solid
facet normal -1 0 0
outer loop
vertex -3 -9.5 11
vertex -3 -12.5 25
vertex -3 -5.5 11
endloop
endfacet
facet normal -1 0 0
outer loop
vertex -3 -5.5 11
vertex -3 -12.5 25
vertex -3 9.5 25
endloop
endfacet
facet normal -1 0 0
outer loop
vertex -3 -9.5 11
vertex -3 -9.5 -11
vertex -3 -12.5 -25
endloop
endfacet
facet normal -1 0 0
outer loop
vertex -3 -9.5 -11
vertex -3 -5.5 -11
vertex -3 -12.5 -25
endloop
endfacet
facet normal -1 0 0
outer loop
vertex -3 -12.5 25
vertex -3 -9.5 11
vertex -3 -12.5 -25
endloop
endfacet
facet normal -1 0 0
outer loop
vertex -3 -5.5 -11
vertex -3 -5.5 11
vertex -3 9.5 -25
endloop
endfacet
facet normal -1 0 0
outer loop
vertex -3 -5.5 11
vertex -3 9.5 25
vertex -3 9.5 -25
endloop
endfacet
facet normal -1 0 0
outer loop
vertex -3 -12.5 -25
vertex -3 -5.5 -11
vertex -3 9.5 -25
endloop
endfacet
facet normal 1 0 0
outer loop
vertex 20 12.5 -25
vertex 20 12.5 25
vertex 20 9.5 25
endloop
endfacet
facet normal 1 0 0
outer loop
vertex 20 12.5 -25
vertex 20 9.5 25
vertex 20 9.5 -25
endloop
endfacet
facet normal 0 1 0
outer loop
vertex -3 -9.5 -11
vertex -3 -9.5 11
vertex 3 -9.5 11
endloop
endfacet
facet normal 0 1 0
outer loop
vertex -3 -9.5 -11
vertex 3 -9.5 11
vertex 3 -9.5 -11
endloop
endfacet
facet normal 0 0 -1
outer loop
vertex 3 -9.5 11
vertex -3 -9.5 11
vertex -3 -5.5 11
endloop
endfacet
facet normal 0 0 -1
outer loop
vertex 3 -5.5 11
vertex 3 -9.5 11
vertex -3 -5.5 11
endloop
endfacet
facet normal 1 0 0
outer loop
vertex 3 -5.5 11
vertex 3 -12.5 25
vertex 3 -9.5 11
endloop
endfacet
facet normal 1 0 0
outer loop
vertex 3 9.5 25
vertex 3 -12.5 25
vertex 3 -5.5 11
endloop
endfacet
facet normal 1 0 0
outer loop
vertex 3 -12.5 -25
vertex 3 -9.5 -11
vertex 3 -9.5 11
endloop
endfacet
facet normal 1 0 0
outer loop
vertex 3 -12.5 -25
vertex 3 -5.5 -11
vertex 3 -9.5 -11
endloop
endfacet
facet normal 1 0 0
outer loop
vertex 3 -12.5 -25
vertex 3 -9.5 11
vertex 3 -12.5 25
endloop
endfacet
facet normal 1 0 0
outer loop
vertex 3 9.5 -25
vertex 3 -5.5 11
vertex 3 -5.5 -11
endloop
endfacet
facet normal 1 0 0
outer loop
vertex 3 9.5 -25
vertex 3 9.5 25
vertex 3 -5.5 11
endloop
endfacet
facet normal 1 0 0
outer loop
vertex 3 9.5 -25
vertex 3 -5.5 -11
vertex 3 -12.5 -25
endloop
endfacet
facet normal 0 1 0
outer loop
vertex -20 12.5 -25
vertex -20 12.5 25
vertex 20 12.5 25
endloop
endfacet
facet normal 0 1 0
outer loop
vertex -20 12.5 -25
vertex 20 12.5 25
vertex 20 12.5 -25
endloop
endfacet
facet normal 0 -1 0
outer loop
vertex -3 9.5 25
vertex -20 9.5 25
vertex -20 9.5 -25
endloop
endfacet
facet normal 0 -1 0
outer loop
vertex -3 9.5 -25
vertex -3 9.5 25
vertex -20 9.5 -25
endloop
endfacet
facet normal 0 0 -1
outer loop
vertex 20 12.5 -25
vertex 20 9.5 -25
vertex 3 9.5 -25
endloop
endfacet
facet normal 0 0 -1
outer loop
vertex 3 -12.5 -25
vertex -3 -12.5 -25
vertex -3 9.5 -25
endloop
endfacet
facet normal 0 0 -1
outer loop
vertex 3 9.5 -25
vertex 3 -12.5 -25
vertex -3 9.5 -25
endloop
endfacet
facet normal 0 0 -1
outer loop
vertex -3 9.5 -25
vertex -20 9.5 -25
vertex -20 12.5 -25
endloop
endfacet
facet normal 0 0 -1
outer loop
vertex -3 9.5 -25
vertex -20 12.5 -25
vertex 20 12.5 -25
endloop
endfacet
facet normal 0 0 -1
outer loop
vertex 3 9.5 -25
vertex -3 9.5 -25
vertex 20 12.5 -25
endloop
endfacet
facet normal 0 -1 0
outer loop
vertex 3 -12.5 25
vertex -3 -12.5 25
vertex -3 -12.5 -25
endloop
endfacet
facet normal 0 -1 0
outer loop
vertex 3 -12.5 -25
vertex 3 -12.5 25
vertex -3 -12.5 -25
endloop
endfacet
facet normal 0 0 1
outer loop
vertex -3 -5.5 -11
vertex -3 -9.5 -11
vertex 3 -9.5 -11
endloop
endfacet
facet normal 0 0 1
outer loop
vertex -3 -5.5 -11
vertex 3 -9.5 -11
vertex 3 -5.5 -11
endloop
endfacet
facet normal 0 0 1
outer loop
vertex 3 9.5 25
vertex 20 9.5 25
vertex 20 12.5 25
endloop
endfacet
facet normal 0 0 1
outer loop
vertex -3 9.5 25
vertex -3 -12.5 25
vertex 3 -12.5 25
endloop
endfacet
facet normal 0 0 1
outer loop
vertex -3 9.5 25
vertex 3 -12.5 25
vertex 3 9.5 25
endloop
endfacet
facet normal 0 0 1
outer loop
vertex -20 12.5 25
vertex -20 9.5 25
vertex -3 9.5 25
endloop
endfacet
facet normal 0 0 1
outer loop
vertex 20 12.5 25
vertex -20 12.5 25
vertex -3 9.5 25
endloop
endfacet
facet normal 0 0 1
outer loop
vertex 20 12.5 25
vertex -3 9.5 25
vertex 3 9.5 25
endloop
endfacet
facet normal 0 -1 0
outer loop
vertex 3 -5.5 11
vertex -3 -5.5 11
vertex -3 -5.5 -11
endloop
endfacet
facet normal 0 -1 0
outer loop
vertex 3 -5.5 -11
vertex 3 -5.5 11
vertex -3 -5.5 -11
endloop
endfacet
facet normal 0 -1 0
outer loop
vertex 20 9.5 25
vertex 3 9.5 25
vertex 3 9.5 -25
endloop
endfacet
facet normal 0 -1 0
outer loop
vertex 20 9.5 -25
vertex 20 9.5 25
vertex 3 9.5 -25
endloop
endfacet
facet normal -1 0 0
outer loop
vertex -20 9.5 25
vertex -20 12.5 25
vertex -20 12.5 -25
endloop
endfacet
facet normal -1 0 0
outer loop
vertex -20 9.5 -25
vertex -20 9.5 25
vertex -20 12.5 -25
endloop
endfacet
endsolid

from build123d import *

# Parameters (mm, degrees)
BOSS_EXTRUDE2_DEPTH      = 3
BOSS_EXTRUDE2_DEPTH_BACK = 3
SKETCH2_W                = 50
SKETCH2_H                = 22
SKETCH2_W_2              = 22
SKETCH2_H_2              = 4
BOSS_EXTRUDE3_DEPTH      = 20
BOSS_EXTRUDE3_DEPTH_BACK = 20
SKETCH2_3_W              = 50
SKETCH2_3_H              = 3


with BuildPart() as part:
    # Sketch2 → Boss-Extrude2 (new, two sides: drawn at the far end of the back side and taken through both)
    with BuildSketch(Plane(origin=(0, 0, 0), x_dir=(0, 0, -1), z_dir=(1, 0, 0)).offset(-BOSS_EXTRUDE2_DEPTH_BACK)):
        with Locations((0, -1.5)):
            Rectangle(SKETCH2_W, SKETCH2_H)
        with Locations((0, -7.5)):
            Rectangle(SKETCH2_W_2, SKETCH2_H_2, mode=Mode.SUBTRACT)
    extrude(amount=BOSS_EXTRUDE2_DEPTH + BOSS_EXTRUDE2_DEPTH_BACK)

    # Sketch2<3> → Boss-Extrude3 (add, two sides: drawn at the far end of the back side and taken through both)
    with BuildSketch(Plane(origin=(0, 0, 0), x_dir=(0, 0, -1), z_dir=(1, 0, 0)).offset(-BOSS_EXTRUDE3_DEPTH_BACK)):
        with Locations((0, 11)):
            Rectangle(SKETCH2_3_W, SKETCH2_3_H)
    extrude(amount=BOSS_EXTRUDE3_DEPTH + BOSS_EXTRUDE3_DEPTH_BACK)


solid = part.part
